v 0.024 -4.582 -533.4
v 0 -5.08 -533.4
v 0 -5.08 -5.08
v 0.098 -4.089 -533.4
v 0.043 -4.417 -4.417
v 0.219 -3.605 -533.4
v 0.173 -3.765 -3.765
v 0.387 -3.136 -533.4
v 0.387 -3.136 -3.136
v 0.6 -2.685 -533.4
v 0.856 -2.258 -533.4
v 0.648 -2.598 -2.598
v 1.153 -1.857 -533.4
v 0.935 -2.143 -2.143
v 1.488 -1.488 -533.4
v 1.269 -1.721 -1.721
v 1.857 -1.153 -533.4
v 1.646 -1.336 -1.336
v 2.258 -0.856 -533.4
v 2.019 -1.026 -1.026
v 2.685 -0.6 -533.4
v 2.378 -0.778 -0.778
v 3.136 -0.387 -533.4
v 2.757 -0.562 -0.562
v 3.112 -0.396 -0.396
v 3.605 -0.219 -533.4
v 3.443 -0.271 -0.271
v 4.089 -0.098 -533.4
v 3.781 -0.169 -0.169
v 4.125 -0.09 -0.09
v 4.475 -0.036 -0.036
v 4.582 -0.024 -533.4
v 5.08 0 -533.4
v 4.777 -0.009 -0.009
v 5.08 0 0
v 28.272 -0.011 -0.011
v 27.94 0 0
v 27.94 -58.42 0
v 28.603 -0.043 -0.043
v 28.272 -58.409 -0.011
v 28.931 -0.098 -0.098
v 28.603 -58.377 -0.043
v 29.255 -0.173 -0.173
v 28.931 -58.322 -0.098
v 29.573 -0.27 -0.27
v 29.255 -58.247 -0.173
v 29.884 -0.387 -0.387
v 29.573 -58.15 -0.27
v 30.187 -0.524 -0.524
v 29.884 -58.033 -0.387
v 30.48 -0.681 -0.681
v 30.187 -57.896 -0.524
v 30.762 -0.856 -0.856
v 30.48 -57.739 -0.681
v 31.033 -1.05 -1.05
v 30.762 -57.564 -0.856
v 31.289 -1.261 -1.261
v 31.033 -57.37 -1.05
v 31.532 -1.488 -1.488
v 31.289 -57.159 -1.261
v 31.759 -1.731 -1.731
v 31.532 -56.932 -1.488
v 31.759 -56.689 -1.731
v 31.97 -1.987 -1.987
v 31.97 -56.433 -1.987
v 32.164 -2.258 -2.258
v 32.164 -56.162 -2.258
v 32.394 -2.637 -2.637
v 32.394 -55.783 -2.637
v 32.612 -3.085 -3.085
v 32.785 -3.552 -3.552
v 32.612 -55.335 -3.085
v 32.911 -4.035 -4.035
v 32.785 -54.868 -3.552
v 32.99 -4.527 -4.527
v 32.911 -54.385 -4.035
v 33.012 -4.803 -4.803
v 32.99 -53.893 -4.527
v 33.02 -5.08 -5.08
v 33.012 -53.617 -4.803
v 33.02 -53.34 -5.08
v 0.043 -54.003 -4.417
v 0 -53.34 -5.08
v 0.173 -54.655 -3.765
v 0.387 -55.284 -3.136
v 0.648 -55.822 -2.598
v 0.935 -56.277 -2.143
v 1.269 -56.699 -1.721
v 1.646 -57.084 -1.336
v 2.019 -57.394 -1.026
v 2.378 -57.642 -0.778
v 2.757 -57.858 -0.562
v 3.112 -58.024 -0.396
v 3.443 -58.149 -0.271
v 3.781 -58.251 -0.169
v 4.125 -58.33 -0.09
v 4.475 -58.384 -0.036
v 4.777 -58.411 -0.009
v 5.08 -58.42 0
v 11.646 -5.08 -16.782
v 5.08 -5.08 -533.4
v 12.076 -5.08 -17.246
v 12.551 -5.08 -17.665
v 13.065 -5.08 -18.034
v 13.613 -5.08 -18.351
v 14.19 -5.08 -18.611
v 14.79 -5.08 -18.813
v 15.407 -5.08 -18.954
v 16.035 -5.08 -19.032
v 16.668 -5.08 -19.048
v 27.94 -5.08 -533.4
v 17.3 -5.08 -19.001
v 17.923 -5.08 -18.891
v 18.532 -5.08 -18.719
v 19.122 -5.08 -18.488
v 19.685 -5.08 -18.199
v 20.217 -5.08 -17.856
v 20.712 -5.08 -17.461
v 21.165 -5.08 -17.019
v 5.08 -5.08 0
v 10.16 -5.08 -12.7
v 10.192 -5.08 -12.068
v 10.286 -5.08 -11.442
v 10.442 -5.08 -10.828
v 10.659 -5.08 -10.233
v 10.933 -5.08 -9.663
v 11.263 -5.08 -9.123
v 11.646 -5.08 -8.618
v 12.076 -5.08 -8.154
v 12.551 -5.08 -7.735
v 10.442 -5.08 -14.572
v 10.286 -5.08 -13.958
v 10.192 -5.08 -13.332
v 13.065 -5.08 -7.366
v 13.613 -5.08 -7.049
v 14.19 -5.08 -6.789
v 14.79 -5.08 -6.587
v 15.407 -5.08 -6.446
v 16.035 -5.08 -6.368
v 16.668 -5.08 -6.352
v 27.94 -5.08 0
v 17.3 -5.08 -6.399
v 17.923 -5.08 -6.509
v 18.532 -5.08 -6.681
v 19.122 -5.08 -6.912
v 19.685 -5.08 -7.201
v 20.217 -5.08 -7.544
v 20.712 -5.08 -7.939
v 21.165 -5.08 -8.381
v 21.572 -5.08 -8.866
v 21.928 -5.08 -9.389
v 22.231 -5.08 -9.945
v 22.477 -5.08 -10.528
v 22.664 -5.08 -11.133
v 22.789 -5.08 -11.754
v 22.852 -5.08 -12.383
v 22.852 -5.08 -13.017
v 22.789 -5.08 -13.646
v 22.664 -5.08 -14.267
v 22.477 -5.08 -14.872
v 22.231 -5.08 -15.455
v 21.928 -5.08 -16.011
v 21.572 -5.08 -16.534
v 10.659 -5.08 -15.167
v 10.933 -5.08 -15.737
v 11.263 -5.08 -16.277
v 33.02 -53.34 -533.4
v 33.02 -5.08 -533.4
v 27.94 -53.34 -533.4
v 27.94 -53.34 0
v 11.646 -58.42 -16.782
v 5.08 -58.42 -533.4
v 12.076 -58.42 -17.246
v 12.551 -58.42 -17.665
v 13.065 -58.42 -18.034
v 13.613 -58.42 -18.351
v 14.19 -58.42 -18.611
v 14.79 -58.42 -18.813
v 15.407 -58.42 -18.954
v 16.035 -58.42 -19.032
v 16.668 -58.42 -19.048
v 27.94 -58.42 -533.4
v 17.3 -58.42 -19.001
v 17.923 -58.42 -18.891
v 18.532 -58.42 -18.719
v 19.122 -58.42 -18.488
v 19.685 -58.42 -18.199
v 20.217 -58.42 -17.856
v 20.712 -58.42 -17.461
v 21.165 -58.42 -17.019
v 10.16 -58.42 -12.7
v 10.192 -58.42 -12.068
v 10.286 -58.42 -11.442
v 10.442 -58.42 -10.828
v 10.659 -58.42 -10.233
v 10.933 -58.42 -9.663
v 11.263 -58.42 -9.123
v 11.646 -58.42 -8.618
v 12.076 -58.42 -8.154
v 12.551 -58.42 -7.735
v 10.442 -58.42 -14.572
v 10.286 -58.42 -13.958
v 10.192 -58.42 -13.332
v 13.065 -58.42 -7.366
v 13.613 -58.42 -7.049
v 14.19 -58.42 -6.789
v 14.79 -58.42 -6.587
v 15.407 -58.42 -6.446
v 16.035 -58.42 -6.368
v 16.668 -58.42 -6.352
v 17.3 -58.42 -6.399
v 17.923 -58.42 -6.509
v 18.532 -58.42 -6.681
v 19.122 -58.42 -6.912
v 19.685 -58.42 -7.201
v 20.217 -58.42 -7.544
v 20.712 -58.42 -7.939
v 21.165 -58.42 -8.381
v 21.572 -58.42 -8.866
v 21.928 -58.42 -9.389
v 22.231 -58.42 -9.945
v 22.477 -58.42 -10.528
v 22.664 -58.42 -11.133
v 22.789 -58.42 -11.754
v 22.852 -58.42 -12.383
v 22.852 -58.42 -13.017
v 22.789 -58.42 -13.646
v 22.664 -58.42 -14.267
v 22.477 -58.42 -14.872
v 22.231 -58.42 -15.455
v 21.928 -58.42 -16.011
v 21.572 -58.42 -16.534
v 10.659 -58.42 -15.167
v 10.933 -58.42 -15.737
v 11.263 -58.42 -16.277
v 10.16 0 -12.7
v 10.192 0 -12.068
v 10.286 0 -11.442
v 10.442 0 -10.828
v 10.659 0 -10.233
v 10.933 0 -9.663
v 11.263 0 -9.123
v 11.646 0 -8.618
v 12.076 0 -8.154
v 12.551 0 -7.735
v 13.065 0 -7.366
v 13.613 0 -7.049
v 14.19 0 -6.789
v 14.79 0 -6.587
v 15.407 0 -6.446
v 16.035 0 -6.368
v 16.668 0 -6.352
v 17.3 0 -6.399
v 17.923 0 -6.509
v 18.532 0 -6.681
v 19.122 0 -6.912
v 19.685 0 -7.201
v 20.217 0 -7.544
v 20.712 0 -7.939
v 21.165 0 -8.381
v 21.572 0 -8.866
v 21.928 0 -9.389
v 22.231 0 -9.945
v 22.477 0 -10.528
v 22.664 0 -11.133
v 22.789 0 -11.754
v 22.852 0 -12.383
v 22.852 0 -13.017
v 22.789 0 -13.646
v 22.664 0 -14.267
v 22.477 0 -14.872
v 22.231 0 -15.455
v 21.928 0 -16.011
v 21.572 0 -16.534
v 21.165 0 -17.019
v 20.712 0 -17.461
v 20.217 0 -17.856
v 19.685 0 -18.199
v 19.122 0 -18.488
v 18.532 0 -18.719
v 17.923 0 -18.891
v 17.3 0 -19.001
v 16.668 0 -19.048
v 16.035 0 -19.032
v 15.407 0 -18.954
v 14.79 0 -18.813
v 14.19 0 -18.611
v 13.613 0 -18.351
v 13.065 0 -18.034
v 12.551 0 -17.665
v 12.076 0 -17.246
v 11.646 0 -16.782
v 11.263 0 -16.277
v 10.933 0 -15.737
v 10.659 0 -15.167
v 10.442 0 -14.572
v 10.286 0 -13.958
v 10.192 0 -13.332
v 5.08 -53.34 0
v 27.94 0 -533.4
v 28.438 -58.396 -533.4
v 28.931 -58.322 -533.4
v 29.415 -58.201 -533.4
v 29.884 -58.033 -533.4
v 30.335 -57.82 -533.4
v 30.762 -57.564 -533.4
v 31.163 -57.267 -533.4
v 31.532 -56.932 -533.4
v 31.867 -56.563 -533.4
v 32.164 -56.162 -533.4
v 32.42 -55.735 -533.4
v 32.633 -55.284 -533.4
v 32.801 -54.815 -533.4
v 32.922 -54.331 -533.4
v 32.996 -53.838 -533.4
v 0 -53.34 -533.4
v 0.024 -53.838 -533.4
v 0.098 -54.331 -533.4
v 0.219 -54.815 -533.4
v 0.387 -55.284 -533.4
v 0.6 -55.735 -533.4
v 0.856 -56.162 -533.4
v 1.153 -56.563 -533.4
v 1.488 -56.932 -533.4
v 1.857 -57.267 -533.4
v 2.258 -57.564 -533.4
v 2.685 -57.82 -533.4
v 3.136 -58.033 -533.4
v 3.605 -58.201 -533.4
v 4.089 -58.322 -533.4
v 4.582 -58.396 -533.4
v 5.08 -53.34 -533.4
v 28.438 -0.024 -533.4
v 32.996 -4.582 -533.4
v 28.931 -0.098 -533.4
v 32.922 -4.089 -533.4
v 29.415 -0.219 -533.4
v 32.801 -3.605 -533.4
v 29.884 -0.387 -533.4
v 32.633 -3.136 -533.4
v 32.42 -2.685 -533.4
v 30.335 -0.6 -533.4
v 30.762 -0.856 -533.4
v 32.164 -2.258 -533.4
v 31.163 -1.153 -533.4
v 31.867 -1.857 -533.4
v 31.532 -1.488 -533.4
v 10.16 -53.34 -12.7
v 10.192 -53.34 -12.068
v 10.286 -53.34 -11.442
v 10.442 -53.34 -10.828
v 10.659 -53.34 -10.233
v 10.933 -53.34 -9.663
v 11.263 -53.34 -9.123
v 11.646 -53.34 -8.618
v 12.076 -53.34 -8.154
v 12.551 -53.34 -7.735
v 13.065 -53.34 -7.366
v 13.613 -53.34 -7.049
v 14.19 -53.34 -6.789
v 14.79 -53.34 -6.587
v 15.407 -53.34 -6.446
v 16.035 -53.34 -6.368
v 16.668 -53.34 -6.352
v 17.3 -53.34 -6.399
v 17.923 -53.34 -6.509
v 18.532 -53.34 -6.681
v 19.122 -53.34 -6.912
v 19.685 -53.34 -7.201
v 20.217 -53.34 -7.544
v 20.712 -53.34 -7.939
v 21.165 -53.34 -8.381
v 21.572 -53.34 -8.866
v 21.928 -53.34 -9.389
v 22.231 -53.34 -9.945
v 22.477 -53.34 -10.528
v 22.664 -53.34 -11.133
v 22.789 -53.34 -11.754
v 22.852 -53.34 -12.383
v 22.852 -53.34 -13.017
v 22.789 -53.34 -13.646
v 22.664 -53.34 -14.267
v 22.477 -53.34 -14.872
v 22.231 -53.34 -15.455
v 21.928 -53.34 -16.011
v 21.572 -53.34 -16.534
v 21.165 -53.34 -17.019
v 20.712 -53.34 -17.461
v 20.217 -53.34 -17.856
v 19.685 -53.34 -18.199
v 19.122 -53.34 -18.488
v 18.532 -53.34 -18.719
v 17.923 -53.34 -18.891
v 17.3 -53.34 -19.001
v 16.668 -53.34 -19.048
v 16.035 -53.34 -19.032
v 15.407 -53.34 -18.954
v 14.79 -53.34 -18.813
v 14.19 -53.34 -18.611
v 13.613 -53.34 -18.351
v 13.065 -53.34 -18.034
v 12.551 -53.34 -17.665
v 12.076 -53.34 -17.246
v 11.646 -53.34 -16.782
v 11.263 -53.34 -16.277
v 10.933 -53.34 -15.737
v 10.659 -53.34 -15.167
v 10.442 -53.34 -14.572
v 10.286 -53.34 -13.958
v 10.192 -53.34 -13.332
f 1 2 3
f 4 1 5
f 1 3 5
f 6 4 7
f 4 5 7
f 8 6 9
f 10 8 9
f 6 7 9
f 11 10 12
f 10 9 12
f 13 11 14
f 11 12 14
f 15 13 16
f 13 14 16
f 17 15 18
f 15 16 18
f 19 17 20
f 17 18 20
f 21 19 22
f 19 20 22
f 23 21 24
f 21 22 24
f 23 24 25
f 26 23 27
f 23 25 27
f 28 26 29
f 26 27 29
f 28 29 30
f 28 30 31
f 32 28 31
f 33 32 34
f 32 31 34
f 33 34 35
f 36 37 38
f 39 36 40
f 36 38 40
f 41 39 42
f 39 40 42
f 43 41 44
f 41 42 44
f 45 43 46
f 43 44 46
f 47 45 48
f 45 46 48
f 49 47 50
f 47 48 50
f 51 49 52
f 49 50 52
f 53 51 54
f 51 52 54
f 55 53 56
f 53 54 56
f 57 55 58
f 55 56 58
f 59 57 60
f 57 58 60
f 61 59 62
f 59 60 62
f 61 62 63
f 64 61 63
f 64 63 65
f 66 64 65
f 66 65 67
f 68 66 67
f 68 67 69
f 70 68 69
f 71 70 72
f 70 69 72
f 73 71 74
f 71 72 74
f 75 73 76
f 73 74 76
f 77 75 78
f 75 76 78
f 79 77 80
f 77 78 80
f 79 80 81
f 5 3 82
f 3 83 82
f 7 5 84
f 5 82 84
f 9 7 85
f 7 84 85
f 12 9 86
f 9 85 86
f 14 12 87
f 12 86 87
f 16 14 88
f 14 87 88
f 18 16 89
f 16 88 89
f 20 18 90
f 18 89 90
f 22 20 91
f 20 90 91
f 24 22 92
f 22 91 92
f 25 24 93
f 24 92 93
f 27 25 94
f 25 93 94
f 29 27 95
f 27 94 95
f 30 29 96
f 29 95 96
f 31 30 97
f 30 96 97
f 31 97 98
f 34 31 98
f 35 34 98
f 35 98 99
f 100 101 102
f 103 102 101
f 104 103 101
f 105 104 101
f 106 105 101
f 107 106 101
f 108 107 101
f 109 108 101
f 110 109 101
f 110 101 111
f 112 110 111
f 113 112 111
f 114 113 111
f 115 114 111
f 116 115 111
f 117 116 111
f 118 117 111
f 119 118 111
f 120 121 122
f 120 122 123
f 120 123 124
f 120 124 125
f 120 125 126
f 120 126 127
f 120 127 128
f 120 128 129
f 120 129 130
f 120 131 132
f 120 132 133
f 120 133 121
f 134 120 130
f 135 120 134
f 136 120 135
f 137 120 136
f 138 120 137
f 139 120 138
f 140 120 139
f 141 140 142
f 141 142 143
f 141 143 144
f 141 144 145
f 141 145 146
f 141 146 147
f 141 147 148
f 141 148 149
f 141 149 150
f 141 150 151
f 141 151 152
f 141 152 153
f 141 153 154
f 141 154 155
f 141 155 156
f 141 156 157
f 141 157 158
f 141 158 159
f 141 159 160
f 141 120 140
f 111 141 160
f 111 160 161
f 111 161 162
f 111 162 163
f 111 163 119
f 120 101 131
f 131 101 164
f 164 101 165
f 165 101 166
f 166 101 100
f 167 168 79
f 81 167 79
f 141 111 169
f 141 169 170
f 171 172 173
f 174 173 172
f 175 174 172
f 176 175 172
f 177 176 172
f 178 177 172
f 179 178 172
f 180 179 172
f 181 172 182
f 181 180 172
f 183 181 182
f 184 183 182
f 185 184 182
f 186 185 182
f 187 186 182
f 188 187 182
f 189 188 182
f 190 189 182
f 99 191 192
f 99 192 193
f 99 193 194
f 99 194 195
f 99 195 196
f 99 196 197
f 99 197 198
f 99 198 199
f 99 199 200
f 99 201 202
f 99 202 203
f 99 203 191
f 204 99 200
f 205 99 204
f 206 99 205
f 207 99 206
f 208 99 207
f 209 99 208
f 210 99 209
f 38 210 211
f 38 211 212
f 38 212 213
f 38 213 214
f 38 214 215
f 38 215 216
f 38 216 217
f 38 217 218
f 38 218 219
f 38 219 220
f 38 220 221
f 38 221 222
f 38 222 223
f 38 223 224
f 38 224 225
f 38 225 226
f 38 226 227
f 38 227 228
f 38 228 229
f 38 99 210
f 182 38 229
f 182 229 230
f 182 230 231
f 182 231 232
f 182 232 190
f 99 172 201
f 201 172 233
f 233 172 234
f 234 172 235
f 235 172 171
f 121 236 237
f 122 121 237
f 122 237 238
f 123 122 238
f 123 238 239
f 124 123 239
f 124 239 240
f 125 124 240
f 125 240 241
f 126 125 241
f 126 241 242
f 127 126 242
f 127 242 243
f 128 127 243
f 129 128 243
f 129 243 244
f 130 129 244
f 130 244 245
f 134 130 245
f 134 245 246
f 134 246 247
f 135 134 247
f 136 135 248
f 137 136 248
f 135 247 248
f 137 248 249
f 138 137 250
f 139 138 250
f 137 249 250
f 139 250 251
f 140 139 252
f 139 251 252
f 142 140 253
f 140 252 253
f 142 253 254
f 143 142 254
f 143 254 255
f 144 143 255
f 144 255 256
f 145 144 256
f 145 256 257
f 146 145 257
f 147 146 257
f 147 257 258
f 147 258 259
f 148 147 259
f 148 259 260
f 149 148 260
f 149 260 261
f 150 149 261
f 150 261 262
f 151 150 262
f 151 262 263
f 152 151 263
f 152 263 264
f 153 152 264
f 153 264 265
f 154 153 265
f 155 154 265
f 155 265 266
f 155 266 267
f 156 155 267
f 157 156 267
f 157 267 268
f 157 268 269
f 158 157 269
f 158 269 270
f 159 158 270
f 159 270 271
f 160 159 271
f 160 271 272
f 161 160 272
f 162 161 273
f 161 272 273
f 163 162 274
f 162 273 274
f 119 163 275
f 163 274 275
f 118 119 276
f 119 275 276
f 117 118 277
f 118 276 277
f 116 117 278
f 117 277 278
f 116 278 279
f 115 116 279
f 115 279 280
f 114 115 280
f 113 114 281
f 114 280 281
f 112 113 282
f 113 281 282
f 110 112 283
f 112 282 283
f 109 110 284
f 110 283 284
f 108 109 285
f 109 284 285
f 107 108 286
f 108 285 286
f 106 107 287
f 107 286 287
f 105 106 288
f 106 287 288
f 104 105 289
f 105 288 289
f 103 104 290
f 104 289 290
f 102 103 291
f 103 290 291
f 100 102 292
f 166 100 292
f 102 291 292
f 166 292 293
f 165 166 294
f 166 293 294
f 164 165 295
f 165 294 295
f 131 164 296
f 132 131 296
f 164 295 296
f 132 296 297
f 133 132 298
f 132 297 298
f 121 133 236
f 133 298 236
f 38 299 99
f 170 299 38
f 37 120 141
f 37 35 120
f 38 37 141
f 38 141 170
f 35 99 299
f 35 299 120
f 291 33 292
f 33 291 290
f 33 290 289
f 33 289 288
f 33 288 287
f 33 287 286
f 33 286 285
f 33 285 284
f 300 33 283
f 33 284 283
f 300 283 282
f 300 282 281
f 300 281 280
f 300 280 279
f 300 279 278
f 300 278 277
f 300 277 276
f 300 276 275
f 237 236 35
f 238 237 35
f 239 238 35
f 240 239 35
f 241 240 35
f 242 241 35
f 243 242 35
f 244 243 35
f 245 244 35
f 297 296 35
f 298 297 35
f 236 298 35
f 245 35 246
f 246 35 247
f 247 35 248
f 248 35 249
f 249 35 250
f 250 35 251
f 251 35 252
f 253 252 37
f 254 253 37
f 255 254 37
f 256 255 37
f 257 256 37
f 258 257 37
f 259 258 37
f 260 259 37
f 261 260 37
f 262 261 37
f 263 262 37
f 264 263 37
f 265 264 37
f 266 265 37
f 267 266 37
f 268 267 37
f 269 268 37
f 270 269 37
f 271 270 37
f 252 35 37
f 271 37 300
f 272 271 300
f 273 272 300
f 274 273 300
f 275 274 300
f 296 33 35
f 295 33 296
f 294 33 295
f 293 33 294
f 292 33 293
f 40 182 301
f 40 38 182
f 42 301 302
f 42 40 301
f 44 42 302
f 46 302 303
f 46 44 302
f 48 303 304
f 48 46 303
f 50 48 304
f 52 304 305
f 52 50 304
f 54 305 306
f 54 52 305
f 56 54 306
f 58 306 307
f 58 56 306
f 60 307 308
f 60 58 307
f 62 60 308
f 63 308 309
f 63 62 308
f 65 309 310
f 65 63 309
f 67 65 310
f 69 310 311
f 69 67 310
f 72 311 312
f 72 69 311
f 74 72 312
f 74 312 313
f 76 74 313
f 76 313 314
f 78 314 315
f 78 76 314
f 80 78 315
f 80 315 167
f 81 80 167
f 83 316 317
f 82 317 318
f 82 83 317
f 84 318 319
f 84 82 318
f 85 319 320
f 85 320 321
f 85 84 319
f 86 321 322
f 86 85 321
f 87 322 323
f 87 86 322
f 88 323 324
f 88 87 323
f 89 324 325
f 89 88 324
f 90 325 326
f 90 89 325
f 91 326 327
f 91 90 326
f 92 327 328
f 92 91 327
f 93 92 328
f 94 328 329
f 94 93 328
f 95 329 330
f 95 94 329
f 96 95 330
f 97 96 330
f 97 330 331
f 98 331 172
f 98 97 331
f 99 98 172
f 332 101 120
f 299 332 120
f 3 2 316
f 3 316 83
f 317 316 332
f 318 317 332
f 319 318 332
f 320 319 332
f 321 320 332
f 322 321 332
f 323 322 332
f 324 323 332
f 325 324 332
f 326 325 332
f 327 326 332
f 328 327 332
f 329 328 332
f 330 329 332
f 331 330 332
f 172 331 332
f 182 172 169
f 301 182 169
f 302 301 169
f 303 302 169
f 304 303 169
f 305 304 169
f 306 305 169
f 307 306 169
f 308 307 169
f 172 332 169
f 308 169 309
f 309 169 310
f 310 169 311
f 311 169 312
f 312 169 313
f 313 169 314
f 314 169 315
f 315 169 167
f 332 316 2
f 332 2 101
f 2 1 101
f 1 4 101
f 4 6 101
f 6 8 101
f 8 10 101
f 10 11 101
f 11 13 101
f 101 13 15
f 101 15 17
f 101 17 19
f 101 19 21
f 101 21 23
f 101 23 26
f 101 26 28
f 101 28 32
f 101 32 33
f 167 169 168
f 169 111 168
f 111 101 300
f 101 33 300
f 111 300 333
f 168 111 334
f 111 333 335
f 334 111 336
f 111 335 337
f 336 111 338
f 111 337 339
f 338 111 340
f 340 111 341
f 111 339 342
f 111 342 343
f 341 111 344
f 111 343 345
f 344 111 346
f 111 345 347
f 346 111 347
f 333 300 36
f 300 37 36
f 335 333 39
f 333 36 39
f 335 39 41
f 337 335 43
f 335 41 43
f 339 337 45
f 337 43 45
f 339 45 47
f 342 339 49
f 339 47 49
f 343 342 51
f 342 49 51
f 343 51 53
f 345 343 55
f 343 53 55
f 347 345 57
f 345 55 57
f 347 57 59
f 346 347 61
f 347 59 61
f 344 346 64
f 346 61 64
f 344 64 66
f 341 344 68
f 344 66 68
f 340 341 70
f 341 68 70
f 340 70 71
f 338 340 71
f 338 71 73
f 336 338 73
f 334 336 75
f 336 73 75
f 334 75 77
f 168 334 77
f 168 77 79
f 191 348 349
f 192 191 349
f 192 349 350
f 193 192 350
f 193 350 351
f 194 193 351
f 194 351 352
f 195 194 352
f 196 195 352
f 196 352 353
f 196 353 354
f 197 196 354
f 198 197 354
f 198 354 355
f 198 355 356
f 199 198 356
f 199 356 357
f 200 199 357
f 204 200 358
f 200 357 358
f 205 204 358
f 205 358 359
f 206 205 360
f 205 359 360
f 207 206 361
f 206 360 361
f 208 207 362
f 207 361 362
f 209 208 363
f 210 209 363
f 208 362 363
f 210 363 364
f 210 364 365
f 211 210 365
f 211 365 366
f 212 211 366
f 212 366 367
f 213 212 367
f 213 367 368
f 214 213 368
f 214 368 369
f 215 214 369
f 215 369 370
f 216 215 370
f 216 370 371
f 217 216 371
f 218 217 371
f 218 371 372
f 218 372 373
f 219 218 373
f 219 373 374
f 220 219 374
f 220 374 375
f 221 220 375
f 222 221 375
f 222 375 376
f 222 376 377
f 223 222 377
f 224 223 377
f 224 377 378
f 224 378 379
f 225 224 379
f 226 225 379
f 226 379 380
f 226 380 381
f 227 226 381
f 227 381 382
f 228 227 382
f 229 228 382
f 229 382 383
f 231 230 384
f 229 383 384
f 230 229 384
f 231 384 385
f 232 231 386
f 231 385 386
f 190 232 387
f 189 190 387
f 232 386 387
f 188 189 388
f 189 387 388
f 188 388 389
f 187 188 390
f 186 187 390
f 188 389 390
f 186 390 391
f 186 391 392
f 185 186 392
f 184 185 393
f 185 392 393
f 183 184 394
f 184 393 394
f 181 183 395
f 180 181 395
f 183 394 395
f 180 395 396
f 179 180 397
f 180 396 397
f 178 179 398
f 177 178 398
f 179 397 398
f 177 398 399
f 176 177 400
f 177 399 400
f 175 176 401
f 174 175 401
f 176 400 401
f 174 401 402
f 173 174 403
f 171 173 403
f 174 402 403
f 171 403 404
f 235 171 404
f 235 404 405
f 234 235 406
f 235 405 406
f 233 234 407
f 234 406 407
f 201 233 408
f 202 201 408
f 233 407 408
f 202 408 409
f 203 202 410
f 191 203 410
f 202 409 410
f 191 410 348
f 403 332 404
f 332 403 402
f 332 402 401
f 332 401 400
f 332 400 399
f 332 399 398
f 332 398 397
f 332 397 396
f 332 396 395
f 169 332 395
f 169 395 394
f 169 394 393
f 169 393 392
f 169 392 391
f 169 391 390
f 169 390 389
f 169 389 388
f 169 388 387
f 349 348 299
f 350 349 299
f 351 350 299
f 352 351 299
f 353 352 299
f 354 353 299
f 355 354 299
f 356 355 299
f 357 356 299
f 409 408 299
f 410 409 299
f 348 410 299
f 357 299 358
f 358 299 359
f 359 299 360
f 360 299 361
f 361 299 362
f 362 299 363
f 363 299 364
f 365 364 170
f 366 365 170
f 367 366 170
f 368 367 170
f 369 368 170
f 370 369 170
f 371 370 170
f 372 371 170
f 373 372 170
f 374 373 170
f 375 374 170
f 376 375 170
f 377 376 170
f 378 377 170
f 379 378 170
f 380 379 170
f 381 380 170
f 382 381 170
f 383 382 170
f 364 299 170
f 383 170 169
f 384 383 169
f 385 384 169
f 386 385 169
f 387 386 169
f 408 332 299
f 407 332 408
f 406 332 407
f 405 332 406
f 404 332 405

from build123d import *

# Parameters (mm, degrees)
F0_W     = 33.02
F0_H     = 533.4
F1_DEPTH = 58.42
F3_T     = -5.08
F4_D     = 12.7
F5_R     = 5.07999


# Not quite as in the source:
# - a fillet or chamfer is up to 0.001 mm smaller than in the source, because OpenCascade refuses the exact size


with BuildPart() as f1:
    # F0 (on Front) → F1 (new body)
    with BuildSketch(Plane.XZ):
        with Locations((16.51, -266.7)):
            Rectangle(F0_W, F0_H)
    extrude(amount=F1_DEPTH)

    # F3
    f3_openings = [f1.faces().sort_by_distance(p)[0] for p in [
        (16.51, -29.21, 0),
        (16.51, -29.21, -533.4),
    ]]
    offset(amount=F3_T, openings=f3_openings)

    # F4 (through all)
    with Locations(Plane.XZ.offset(58.42)):
        with Locations((16.51, -12.7)):
            Hole(F4_D / 2)

    # F5 (radius 5.08 in the source; OpenCascade refuses exactly that, so slightly less here)
    f5_edges = [f1.edges().sort_by_distance(p)[0] for p in [
        (0, -58.42, -266.7),
        (33.02, -58.42, -266.7),
        (33.02, 0, -266.7),
        (0, 0, -266.7),
        (33.02, -29.21, 0),
        (0, -29.21, 0),
    ]]
    fillet(f5_edges, radius=F5_R)


solid = f1.part
